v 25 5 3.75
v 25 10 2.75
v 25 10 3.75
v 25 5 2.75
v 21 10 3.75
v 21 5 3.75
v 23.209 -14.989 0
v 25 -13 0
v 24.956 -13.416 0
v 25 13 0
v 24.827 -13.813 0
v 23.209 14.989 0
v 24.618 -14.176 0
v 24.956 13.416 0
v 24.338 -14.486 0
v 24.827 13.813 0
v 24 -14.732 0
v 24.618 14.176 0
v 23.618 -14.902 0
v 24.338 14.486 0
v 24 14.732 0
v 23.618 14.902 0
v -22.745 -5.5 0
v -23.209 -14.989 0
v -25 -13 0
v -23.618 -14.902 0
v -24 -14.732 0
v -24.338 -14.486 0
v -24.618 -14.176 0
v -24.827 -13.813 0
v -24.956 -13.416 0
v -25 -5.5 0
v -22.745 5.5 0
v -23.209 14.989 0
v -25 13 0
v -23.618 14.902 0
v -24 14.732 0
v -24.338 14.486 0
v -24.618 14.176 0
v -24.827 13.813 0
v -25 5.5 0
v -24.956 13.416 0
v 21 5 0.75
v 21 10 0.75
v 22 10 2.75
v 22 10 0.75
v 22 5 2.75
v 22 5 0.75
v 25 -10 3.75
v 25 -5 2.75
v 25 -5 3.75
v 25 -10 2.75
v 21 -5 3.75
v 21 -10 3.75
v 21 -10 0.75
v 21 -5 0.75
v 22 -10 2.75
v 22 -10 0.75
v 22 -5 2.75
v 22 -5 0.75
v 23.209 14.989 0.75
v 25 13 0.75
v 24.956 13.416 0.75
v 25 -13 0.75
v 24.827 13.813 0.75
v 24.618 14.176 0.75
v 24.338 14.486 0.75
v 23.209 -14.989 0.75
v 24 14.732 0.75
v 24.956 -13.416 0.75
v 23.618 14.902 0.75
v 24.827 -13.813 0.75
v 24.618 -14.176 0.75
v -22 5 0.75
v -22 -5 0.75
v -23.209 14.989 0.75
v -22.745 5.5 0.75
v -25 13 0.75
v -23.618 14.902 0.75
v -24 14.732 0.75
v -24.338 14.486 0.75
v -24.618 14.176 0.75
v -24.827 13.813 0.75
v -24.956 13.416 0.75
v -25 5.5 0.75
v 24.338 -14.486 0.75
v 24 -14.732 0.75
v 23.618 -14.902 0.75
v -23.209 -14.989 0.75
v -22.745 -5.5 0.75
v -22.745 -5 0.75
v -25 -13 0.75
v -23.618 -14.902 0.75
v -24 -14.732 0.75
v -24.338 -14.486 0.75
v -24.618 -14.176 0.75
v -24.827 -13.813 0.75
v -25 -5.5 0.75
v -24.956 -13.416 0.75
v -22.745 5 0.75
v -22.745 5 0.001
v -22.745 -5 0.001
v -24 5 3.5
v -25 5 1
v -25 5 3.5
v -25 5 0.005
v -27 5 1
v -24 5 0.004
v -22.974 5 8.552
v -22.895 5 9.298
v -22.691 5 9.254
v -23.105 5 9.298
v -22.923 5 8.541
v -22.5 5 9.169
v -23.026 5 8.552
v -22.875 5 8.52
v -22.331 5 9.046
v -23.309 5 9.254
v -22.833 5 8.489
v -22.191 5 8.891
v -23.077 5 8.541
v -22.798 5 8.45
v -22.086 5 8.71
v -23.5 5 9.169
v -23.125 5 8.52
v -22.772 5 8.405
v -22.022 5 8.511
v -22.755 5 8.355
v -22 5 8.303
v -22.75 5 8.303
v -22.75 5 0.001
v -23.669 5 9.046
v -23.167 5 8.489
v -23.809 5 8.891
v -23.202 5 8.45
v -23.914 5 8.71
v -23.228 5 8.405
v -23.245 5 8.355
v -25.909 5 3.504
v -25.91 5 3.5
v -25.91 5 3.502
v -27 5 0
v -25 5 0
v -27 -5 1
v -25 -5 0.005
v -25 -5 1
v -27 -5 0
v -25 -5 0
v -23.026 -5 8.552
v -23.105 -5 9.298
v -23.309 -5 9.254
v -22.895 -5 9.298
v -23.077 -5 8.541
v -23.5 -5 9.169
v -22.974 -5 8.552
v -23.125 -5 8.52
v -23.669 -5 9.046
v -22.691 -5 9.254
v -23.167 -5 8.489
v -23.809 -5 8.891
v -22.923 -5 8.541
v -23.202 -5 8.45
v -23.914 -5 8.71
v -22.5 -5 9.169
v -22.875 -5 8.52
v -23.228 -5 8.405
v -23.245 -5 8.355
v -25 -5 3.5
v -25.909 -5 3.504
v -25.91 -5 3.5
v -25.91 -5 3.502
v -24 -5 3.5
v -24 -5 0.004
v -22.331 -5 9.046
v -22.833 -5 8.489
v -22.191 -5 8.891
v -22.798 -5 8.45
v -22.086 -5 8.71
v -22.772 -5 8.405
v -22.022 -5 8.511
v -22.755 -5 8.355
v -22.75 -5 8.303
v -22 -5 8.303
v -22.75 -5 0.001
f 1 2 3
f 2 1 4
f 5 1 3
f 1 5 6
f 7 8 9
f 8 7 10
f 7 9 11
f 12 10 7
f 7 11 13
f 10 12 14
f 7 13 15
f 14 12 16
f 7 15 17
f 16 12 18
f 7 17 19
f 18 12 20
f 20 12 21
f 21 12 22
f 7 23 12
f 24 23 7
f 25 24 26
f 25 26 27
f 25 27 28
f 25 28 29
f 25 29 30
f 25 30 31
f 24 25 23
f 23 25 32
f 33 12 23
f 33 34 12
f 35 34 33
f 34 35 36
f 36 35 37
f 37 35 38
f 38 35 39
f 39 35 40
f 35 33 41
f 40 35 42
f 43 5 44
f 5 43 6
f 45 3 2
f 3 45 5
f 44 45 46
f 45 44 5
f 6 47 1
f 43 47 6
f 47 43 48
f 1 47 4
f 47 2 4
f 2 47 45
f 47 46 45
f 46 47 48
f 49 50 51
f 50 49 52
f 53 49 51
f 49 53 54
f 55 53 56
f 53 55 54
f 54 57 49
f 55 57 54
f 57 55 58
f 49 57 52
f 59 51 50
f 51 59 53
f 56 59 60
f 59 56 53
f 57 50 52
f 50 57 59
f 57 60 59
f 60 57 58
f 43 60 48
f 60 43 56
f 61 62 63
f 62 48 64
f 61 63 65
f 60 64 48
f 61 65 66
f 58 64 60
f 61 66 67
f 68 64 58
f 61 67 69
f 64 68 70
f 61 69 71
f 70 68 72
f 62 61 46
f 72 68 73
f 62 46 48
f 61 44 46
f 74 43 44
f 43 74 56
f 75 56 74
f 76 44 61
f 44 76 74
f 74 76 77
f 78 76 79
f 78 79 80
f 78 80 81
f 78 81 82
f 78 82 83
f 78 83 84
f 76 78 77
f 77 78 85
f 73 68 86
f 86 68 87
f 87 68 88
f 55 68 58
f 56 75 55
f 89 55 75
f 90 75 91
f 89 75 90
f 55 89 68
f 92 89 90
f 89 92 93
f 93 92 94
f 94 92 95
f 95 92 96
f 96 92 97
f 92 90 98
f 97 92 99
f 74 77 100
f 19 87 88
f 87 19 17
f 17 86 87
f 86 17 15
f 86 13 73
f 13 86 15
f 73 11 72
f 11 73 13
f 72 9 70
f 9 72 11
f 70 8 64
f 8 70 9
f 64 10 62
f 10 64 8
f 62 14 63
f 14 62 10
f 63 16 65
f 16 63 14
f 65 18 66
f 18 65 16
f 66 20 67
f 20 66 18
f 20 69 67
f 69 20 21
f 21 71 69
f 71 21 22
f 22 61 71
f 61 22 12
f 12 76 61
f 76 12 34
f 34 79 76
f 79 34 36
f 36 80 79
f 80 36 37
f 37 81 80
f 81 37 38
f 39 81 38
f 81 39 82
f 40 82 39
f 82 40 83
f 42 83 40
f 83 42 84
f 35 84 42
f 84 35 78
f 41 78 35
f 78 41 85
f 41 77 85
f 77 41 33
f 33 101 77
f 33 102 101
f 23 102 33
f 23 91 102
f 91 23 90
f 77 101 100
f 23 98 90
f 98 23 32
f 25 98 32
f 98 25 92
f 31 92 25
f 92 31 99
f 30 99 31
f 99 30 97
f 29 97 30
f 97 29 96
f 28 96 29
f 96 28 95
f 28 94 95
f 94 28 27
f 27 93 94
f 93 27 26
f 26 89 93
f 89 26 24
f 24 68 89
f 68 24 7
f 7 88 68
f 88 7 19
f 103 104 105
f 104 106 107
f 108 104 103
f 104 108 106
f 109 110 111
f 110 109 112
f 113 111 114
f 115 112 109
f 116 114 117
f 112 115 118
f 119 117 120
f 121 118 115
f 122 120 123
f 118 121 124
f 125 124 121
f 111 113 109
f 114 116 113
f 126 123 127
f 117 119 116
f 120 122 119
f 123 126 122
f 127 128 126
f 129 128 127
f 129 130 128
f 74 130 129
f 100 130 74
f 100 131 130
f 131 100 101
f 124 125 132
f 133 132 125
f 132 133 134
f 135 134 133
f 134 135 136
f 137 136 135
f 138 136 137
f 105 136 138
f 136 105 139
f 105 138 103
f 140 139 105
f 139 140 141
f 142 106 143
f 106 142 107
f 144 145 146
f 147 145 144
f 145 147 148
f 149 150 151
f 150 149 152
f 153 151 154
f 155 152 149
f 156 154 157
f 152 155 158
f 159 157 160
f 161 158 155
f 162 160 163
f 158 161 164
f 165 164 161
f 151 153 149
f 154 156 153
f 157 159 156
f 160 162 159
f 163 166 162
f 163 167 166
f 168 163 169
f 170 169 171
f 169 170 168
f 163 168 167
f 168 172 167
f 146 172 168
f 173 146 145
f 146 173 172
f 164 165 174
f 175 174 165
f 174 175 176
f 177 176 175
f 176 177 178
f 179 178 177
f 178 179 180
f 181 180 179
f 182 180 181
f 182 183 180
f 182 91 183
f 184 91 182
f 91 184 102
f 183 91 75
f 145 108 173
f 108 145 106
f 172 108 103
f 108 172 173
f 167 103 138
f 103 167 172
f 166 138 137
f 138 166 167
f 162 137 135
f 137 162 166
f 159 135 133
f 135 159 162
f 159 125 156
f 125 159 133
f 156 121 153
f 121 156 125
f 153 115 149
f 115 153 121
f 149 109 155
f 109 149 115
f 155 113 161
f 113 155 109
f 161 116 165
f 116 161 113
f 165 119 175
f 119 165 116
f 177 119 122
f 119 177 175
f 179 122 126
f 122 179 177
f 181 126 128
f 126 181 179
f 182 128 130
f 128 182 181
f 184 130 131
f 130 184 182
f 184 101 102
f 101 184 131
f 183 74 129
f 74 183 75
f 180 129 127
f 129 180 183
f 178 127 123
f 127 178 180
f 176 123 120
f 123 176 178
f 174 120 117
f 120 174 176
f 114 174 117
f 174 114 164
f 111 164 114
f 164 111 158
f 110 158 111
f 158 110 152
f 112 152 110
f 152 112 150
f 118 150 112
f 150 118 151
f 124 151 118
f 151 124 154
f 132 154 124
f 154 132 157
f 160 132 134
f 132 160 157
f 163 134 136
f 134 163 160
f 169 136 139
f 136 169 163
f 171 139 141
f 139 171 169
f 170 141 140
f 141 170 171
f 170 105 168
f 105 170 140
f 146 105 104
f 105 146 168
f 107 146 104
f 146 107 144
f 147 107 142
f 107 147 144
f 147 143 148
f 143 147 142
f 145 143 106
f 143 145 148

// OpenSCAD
// This thing generates custom battery covers
//
// v2.0
//
// Licenced under Creative Commons: Attribution, Share-Alike
//		http://creativecommons.org/licenses/by-sa/3.0/
// For attribution you can direct people to the original file on thingiverse:
// 		http://www.thingiverse.com/thing:243269

// ================ variables

//CUSTOMIZER VARIABLES


/* [Basic] */

// how long the battery cover is.  (This dimension is in the clip-to-hooks direction.)
length=50;

// how wide the battery cover is
width=30;

// how thick the battery cover is
thickness=0.75;

// radius for rounding over the corners of the battery cover
corner_radius=2;


/* [Hooks] */

// how wide the hook tabs are
hook_width=5;

// how long the hook tabs are
hook_length=3;

// How far the hooks are in/out relative to the edge of the battery cover (often the same as hook_length).
hook_offset=3;

// how far apart the hooks are (on the inside).  (To create one wide hook, just set this to 0.)
hook_spacing=10;

// How thick the case is where the hooks attach, aka, how high the hole in the hook should be.
hook_case_thickness=2;

// how thick the back of the hooks are
hook_back_thickness=1.0;

// how thick the top part of the hooks are
hook_top_thickness=1.0;


/* [Clip] */

// How wide the clip is
clip_width=10;

// How deep the clip is (overhang)
clip_tooth=1;

// How long the clip is
clip_length=3;

// This is used for a side-engagement clip.  Most clips are this way now.  It measures how wide the small part of the clip is.
clip_width_sides=10;

// This is for a front-engagement clip.  If unused, set it to 0, otherwise, how long the catch will be (usually about 2-3mm)
clip_length_catch=1;

// How far the clip is in/out relative to the edge of the battery cover.
clip_offset=0;

// This is how far down into the battery case the clip engages.  Usually it should be the same as "thickness" on the "basic" tab
clip_case_thickness=3.5;

// The thickness of the finger tab
clip_tab_length=1;

// how thick the clip material is (probably never need to change)
clip_thickness=1;

// spacing between the clip and the body for movement (probably never need to change)
clip_width_margin=0.5;

// how thick to make the spring part of the clip (probably never need to change)
clip_spring_thickness=0.75;


/* [Support gussets] */

// Which direction the support gussets go
gusset_orientation=0; // [0:clip_lengthwise,1:clip_widthwise]

// How thick the gussets are (set to 0 to turn off gussets)
gusset_thickness=0;

// How high the gussets are
gusset_height=1;

// How far apart the gussets are
gusset_spacing=10;


/* [Advanced] */

// Resolution
$fn=30;


/* [hidden] */

scoche=0.01;
halfscoche=scoche/2;

module clip(clip_width=15,clip_width_sides=10,clip_length=1,clip_case_thickness=5,clip_length_catch=3,clip_tab_length=3,clip_spring_thickness=0.75) {
	slope=0.33; // this is only a ballpark
	top_r=clip_length/3;
	top_r_x=clip_length-top_r;
	top_r_y=clip_length+clip_case_thickness/slope/2;
	overlap_tab_w=2;
	inside_void_d1=top_r*2-clip_spring_thickness*2;
	inside_void_d2=top_r*2-clip_spring_thickness*2;
	inside_void_x=top_r_x;
	clip_tab_thickness=1;
	rotate([90,0,0]) linear_extrude(clip_width) difference () {
		union(){ // the outside shape
			hull () {
				translate([0,clip_tab_thickness]) circle(r=clip_tab_thickness); // outside radius
				translate([clip_length-scoche,0]) square([scoche,clip_tab_thickness]); // inside corner
				translate([top_r_x,top_r_y]) circle(r=top_r); // top
				if(clip_length_catch>0){
					translate([-clip_length_catch+0.1,clip_case_thickness]) circle(r=scoche); // add a front overhang
				}
			}
			translate([-overlap_tab_w,0]) square([overlap_tab_w,clip_tab_thickness]); // the overlap tab
		}
		union(){
			translate([inside_void_x,0]) hull() { // The inside void
				translate([0,top_r_y]) circle(r=inside_void_d1/2);
				translate([-inside_void_d2/2,-clip_tab_length-scoche]) square([inside_void_d2,scoche]);
				// a hollow for being able to push the thing over (especially when opening is less than the hook)
				translate([-clip_tooth,0]) square([clip_tooth,clip_case_thickness]);
			}
			// trim the tab overhang
			translate([-clip_tab_length-clip_tooth,clip_tab_thickness]) square([clip_tooth*2,clip_case_thickness-clip_tab_length]);
		}
	}
}

module hook(size,hook_back_thickness,hook_top_thickness){
	difference(){
		cube(size);
		translate([hook_back_thickness,-size[1]/2,-hook_top_thickness]) cube([size[0],size[1]*2,size[2]]);
	}
}

module hooks(length,hook_length,thickness,hook_spacing,hook_width,hook_case_thickness,hook_back_thickness,hook_top_thickness,hook_offset){
	size=[hook_length+hook_back_thickness,hook_width,hook_case_thickness+hook_top_thickness+thickness];
	                translate([length/2-hook_back_thickness-hook_offset,hook_spacing/2,0]) hook(size,hook_back_thickness,hook_top_thickness);
	mirror([0,1,0]) translate([length/2-hook_back_thickness-hook_offset,hook_spacing/2,0]) hook(size,hook_back_thickness,hook_top_thickness);
}

module flatBase(length,width,corner_radius,thickness,clip_width,clip_length,clip_thickness,clip_width_margin=0.5,clip_offset=0,clip_spring_thickness=0.75){
	clip_hole=[clip_length+scoche-clip_offset-clip_spring_thickness,clip_width+clip_width_margin*2];
	linear_extrude(thickness) difference(){
		// the basic shape
		translate([-length/2,-width/2]) minkowski(){
			translate([corner_radius,corner_radius]) square([length-corner_radius*2,width-corner_radius*2]);
			if(corner_radius>0) circle(r=corner_radius);
		}
		// a hole for the clip
		translate([-length/2-scoche/2,-clip_hole[1]/2]) square(clip_hole); // the hole for the clip
	}	
}

module gussets(width,length,gusset_orientation=0,gusset_thickness=1,gusset_height=3,gusset_spacing=5){
	if(gusset_orientation==0){ // lengthwise
		translate([-length/2,gusset_spacing/2,0]) cube([length,gusset_thickness,gusset_height]);
		mirror([0,1,0])translate([-length/2,gusset_spacing/2,0]) cube([length,gusset_thickness,gusset_height]);
	}else{ // crosswise
		translate([gusset_spacing/2,-width/2,0]) cube([gusset_thickness,width,gusset_height]);
		mirror([1,0,0])translate([gusset_spacing/2,-width/2,0]) cube([gusset_thickness,width,gusset_height]);
	}
}

module cover(width=30,length=60,thickness=0.5,hook_case_thickness=3.9,
	gusset_orientation=0,gusset_thickness=1,gusset_height=3,gusset_spacing=5,
	corner_radius=1,hook_width=7.5,hook_spacing=29,clip_width=15,clip_width_sides=10,
	clip_length=1,clip_length_catch=3,clip_case_thickness=5,hook_length=5.8,clip_tab_length=3,
	clip_width_margin=0.5,clip_offset=0,hook_back_thickness=0.5,hook_top_thickness=0.5,clip_spring_thickness=0.75,
	hook_offset=0)
{
	gussetInset=max(hook_length,clip_length-clip_offset); // need to make sure it's short enough not to interfere with other parts
	flatBase(length,width,corner_radius,thickness,clip_width,clip_length,clip_thickness,clip_width_margin,clip_offset,clip_spring_thickness);
	hooks(length,hook_length,thickness,hook_spacing,hook_width,hook_case_thickness,hook_back_thickness,hook_top_thickness,hook_offset);
	gussets(width,length-gussetInset*2,gusset_orientation,gusset_thickness,gusset_height+thickness,gusset_spacing);
	translate([-length/2-clip_offset,clip_width/2,0]) clip(clip_width,clip_width_sides,clip_length,clip_case_thickness,clip_length_catch,clip_tab_length,clip_spring_thickness);
}


cover(width,length,thickness,hook_case_thickness,
	gusset_orientation,gusset_thickness,gusset_height,gusset_spacing,
	corner_radius,hook_width,hook_spacing,clip_width,clip_width_sides,
	clip_length,clip_length_catch,clip_case_thickness,hook_length,clip_tab_length,
	clip_width_margin,clip_offset,hook_back_thickness,hook_top_thickness,clip_spring_thickness,
	hook_offset);
